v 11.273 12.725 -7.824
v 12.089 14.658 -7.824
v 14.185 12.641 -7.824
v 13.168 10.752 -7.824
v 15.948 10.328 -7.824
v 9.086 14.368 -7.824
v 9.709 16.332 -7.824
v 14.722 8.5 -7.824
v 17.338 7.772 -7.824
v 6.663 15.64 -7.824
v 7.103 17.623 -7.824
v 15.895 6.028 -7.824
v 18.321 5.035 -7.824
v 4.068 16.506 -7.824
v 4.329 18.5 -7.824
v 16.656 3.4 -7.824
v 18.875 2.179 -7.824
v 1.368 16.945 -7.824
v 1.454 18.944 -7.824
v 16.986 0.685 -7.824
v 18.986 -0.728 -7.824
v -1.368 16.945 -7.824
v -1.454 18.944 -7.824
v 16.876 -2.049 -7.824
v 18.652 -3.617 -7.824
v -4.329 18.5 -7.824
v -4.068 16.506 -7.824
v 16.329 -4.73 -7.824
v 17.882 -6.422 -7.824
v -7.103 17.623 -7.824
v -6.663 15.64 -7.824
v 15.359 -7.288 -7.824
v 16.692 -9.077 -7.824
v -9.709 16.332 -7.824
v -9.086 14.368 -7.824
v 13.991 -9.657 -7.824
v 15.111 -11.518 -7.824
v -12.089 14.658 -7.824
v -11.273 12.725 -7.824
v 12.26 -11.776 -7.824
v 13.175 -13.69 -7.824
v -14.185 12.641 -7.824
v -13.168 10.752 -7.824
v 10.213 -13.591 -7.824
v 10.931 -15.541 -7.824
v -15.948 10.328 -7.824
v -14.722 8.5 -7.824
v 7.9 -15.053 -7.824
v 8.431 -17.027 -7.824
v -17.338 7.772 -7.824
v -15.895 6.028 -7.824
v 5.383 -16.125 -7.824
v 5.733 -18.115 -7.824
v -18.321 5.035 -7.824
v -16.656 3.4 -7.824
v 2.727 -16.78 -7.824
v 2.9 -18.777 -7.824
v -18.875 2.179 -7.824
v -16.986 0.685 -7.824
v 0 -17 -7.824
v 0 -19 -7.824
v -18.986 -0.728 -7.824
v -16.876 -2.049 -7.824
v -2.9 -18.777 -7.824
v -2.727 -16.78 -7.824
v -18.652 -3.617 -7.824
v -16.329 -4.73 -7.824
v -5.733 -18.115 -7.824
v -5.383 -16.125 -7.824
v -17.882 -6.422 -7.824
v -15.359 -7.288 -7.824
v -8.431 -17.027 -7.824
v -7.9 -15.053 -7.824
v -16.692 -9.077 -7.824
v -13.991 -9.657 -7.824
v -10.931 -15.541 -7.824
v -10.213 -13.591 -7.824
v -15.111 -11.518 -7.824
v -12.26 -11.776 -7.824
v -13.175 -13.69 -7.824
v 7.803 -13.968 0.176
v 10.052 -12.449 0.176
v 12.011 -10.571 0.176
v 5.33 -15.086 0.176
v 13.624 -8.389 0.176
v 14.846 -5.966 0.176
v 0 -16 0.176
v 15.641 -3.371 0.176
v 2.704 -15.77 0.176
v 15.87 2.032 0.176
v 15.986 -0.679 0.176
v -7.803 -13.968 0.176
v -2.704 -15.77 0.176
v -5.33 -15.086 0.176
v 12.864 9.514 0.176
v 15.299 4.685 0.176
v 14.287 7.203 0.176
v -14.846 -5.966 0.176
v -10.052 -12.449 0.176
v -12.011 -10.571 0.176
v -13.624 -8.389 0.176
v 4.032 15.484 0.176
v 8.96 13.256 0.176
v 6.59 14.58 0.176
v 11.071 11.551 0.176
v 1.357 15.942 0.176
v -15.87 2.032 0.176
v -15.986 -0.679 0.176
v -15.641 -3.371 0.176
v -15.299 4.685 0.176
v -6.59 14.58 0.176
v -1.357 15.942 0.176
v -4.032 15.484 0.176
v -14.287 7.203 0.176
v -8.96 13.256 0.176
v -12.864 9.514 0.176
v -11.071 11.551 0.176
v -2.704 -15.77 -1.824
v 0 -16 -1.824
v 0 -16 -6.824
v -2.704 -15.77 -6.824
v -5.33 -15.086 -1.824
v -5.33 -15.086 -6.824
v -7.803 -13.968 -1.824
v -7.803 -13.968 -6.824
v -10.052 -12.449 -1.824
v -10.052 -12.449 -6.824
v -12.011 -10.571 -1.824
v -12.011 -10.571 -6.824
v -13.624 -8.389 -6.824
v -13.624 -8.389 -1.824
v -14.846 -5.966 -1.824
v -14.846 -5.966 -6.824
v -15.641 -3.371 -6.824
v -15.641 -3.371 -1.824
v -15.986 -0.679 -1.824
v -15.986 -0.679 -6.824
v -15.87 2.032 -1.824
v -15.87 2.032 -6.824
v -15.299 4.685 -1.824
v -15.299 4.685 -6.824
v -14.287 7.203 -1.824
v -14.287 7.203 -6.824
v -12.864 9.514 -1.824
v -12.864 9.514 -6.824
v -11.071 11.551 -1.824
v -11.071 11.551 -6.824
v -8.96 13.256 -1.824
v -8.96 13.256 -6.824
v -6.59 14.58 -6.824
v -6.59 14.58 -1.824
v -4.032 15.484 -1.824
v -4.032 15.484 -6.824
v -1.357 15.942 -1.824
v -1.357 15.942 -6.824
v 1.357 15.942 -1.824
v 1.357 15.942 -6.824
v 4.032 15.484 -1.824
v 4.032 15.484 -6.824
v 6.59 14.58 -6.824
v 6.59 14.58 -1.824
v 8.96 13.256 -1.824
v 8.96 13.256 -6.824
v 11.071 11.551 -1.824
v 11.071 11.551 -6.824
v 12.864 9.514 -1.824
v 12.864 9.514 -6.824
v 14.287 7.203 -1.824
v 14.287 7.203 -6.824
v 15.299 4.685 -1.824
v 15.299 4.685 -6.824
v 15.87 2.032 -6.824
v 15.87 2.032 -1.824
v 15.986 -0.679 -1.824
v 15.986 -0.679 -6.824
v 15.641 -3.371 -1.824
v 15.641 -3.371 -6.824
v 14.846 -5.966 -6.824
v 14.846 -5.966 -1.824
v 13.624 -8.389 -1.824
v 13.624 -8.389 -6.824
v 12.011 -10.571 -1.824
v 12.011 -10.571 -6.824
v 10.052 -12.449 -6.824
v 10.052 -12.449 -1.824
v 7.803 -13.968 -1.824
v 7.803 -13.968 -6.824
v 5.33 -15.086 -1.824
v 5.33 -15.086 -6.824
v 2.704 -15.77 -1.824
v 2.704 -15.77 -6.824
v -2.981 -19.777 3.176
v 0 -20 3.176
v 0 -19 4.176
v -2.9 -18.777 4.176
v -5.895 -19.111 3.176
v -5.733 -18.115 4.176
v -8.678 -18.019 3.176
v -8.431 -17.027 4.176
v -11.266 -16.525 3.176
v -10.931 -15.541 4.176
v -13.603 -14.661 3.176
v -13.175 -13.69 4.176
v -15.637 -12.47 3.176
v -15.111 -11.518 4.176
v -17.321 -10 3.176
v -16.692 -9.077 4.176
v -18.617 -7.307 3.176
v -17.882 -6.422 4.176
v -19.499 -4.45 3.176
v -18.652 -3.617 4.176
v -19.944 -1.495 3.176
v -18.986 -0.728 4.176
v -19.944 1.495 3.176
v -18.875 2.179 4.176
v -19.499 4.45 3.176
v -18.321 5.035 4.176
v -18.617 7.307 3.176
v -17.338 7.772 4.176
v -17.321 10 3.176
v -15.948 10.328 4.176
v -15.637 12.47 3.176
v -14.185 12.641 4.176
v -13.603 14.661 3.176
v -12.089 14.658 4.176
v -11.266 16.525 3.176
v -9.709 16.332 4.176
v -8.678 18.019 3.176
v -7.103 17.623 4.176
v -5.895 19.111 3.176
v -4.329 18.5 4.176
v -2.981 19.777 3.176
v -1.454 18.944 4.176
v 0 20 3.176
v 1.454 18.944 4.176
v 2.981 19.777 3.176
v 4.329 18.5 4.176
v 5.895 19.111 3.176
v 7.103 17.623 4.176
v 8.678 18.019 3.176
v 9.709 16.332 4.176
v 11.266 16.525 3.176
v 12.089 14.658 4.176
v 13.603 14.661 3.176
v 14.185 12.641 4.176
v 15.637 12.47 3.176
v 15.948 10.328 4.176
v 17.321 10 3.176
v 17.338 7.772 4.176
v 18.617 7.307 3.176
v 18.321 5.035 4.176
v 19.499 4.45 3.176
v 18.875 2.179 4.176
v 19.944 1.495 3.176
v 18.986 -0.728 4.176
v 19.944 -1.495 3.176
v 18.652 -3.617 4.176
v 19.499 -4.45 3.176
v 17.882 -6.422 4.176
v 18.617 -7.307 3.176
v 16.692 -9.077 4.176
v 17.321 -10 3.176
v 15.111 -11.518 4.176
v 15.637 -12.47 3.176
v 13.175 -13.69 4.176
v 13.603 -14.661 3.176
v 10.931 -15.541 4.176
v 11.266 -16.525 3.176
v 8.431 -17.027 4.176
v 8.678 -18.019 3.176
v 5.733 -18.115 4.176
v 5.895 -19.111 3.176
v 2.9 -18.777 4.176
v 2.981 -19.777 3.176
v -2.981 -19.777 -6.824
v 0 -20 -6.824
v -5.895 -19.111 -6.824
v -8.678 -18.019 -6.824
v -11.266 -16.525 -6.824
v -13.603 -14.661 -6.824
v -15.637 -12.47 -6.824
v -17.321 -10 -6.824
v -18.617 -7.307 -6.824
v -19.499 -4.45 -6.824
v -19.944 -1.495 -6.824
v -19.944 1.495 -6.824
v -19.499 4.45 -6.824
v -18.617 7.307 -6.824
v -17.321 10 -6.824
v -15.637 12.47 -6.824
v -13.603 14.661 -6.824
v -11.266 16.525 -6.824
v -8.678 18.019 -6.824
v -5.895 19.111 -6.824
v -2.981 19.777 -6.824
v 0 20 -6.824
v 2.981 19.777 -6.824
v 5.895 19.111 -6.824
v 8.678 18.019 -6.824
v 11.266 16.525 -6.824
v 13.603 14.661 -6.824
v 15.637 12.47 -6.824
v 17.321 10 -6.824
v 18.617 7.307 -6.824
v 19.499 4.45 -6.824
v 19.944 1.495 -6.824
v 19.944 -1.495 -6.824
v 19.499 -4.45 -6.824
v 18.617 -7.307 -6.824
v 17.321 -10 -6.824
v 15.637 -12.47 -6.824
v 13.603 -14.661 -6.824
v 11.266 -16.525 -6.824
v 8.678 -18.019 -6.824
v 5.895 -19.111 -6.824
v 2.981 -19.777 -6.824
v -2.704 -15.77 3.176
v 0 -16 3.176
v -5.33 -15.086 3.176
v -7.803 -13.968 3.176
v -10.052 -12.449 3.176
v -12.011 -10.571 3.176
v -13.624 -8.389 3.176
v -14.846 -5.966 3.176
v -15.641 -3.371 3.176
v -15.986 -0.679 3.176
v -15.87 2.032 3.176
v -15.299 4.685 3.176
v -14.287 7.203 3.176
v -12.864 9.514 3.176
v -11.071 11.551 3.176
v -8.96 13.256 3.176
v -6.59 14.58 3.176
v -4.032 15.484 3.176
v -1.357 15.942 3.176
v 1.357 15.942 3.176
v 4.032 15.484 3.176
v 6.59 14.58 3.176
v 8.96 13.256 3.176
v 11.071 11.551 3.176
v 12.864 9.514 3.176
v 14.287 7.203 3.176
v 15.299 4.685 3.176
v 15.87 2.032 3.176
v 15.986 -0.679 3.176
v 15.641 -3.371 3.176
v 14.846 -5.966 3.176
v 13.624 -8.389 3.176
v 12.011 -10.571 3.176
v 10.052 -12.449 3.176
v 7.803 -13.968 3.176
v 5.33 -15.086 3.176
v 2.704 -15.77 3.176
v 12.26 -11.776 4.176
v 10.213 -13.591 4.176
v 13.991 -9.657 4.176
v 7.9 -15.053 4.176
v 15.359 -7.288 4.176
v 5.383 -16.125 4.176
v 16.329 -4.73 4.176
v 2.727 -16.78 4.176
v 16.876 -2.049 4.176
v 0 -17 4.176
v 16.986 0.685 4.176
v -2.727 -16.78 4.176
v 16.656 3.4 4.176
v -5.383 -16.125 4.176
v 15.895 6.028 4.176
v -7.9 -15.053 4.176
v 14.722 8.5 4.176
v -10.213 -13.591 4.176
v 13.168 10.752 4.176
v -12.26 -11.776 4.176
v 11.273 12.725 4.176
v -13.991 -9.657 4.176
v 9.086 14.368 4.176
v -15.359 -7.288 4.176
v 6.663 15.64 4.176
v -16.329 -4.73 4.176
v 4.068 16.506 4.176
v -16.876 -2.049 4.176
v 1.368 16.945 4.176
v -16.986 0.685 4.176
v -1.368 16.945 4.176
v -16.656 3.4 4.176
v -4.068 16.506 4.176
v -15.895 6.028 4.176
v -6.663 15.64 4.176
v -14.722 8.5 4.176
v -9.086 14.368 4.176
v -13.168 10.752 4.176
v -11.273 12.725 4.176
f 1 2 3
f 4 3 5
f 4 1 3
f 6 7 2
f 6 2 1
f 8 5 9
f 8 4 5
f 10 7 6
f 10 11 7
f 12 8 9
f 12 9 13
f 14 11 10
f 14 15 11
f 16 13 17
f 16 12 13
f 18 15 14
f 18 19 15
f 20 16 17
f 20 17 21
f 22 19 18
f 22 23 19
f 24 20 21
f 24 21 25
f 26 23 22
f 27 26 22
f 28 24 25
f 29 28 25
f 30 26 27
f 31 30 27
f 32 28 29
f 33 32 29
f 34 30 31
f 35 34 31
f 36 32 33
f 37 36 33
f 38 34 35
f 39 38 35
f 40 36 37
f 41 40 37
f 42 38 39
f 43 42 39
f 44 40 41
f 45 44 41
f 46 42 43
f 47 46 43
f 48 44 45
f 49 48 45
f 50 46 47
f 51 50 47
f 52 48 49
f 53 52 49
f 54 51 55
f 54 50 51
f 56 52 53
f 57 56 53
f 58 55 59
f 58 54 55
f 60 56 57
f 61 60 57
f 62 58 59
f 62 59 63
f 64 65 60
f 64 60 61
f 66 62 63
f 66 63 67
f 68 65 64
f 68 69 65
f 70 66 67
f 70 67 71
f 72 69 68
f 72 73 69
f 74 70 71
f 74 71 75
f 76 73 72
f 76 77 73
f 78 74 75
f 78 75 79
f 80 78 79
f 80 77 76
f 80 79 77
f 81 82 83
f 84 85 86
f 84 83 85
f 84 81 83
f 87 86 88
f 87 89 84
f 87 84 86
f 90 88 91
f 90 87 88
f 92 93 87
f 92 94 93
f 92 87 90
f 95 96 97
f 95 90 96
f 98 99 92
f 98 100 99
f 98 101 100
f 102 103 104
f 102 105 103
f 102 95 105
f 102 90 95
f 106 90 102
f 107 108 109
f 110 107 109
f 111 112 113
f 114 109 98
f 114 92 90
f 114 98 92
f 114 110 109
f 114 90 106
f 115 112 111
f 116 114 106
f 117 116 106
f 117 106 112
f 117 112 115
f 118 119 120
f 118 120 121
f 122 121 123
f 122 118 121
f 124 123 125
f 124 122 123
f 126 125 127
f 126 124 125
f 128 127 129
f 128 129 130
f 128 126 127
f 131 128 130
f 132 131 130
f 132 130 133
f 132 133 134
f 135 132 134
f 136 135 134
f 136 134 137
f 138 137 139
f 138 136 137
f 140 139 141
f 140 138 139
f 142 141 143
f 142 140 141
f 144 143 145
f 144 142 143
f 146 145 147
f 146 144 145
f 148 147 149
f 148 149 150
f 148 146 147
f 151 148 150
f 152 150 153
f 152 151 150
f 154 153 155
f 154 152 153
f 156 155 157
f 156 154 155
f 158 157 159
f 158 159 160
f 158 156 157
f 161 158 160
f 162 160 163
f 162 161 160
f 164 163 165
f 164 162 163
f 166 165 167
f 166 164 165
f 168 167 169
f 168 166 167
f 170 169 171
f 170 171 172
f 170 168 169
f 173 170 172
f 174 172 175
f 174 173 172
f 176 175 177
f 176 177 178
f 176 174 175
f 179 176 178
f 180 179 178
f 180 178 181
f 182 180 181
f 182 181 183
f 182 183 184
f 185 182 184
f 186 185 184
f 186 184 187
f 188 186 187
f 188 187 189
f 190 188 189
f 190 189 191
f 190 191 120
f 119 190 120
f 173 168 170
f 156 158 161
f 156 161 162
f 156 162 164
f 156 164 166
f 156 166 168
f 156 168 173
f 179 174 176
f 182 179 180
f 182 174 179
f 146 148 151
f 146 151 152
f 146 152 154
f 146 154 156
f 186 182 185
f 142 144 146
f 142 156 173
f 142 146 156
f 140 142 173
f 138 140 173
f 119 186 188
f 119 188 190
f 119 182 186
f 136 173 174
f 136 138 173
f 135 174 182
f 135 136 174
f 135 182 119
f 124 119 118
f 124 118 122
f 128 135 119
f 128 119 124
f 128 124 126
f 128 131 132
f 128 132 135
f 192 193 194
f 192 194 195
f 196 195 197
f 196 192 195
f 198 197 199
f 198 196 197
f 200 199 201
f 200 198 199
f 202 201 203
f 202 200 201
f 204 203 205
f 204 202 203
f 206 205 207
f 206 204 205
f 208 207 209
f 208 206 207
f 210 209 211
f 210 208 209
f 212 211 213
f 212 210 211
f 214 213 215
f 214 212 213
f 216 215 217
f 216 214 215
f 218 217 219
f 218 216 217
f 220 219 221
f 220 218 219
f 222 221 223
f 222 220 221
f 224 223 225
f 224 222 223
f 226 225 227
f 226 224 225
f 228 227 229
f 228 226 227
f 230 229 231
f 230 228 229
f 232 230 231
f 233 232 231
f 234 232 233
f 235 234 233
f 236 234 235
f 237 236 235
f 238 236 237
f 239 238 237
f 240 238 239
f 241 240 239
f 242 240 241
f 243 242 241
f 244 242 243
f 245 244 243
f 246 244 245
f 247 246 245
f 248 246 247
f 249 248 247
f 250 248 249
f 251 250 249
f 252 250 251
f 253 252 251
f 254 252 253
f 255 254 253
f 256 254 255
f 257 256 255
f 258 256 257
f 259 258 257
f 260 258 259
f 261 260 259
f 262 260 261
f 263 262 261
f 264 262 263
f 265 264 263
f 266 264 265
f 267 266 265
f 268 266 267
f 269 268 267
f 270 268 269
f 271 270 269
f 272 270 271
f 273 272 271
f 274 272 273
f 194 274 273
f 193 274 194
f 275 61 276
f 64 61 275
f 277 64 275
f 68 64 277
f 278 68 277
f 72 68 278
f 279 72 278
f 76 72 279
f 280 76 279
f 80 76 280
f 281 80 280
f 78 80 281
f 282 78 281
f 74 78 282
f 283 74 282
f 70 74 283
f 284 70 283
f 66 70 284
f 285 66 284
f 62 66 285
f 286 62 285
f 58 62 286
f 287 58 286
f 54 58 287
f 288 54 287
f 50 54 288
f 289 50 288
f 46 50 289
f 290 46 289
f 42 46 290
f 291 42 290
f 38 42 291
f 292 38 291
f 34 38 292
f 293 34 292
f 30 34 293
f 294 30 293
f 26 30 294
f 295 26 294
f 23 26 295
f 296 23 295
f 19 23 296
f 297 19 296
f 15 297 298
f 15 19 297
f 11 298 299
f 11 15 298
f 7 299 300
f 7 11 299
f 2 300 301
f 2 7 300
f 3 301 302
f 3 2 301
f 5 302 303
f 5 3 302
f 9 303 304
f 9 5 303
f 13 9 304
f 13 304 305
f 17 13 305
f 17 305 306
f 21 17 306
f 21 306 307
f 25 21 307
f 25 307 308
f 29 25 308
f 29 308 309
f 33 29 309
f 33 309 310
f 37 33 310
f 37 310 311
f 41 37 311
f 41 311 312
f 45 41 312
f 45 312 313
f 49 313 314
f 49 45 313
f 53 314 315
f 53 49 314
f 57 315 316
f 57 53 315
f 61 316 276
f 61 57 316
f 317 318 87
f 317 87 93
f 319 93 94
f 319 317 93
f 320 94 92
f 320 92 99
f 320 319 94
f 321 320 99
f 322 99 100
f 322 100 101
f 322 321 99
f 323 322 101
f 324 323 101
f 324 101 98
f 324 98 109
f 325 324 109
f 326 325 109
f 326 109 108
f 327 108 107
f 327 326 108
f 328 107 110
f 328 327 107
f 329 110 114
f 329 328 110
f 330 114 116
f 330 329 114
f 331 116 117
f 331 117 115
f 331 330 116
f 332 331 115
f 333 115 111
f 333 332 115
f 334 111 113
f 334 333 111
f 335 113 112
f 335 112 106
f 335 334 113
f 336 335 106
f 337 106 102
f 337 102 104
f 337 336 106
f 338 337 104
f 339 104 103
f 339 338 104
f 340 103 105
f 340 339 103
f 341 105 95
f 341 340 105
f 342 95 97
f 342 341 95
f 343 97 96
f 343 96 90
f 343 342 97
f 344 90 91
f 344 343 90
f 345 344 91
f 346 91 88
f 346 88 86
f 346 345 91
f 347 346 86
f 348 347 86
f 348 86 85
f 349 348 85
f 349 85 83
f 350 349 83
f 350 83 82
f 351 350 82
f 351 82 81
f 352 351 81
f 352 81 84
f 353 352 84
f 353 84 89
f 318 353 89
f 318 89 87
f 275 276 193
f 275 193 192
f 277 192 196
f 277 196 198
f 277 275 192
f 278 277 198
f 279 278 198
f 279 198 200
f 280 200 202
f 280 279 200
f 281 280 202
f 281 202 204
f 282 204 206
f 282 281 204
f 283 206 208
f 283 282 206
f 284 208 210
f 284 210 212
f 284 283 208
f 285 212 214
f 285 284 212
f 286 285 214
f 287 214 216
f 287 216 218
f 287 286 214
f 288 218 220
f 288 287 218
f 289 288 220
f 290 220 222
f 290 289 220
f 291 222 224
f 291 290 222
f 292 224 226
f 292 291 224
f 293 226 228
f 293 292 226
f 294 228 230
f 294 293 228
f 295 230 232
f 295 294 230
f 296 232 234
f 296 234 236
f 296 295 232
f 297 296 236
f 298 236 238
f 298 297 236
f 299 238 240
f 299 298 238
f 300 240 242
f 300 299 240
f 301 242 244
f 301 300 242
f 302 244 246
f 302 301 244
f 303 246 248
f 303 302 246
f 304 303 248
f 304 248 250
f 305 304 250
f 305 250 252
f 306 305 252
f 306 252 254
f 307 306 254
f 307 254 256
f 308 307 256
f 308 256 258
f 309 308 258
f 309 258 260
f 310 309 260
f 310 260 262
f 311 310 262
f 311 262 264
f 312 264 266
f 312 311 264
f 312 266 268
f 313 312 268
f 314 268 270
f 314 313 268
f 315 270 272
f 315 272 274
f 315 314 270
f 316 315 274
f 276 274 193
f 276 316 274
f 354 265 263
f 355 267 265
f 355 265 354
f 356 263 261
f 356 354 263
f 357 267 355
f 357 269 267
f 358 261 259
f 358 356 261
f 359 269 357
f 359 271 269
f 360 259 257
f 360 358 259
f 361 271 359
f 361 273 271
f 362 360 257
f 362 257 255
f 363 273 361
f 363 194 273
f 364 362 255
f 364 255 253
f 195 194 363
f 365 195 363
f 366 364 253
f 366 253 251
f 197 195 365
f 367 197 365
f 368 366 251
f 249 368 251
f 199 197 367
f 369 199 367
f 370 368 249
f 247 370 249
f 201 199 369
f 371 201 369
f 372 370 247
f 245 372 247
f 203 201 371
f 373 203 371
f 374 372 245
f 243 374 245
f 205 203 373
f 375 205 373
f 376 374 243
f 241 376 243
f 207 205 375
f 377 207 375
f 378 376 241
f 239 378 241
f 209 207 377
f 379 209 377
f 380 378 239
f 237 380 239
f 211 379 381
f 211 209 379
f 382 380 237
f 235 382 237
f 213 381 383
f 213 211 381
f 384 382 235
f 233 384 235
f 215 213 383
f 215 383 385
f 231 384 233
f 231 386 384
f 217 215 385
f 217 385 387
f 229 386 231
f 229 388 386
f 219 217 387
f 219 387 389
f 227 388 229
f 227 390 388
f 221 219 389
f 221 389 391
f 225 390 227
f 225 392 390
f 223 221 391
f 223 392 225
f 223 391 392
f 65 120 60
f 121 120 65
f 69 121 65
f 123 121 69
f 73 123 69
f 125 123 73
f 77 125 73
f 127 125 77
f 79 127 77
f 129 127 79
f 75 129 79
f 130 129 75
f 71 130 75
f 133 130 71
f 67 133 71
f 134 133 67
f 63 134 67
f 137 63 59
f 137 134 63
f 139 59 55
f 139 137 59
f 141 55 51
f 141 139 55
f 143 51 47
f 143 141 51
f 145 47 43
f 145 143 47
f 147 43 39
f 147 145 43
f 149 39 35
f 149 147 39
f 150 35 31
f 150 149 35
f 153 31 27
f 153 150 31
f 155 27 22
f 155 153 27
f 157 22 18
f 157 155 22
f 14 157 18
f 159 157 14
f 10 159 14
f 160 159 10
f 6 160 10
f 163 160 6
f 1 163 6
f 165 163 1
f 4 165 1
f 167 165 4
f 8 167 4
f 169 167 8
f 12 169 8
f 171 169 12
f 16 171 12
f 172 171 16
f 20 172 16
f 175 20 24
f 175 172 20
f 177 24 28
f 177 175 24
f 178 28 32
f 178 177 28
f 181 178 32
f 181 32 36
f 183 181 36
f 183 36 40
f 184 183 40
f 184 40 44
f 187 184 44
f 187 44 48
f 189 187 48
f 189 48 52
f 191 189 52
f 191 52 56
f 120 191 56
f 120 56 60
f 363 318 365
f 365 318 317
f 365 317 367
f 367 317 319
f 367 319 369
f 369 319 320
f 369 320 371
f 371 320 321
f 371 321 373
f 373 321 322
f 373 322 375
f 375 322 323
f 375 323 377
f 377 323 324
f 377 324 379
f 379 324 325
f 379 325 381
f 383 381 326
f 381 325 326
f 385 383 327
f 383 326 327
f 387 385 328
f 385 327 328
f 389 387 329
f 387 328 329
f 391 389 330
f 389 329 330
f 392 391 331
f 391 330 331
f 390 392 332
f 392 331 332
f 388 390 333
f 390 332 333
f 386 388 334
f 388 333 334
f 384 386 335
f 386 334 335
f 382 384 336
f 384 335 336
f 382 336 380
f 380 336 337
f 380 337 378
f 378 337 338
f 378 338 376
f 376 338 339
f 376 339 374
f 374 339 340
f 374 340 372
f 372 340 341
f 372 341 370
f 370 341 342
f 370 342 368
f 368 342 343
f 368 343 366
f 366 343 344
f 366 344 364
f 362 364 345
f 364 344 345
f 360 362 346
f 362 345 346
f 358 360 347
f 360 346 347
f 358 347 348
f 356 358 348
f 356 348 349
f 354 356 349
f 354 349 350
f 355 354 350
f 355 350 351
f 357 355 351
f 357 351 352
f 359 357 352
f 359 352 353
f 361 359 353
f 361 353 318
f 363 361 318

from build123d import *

# Parameters (mm, degrees)
F2_SIZE = 1


with BuildPart() as f1:
    # F0 (on Right) → F1 (revolve)
    with BuildSketch(Plane.YZ):
        Polygon((-16, 4.175502), (-20, 4.175502), (-20, -7.824498), (-16, -7.824498), (-16, -1.824498), (0, -1.824498), (0, 0.175502), (-16, 0.175502), align=None)
    revolve(axis=Axis((0, 0, -1.638931), (0, 0, -1)))

    # F2
    f2_edges = [f1.edges().sort_by_distance(p)[0] for p in [
        (0, 16, 4.175502),
        (0, 20, 4.175502),
        (0, 20, -7.824498),
        (0, 16, -7.824498),
    ]]
    chamfer(f2_edges, length=F2_SIZE)


solid = f1.part
